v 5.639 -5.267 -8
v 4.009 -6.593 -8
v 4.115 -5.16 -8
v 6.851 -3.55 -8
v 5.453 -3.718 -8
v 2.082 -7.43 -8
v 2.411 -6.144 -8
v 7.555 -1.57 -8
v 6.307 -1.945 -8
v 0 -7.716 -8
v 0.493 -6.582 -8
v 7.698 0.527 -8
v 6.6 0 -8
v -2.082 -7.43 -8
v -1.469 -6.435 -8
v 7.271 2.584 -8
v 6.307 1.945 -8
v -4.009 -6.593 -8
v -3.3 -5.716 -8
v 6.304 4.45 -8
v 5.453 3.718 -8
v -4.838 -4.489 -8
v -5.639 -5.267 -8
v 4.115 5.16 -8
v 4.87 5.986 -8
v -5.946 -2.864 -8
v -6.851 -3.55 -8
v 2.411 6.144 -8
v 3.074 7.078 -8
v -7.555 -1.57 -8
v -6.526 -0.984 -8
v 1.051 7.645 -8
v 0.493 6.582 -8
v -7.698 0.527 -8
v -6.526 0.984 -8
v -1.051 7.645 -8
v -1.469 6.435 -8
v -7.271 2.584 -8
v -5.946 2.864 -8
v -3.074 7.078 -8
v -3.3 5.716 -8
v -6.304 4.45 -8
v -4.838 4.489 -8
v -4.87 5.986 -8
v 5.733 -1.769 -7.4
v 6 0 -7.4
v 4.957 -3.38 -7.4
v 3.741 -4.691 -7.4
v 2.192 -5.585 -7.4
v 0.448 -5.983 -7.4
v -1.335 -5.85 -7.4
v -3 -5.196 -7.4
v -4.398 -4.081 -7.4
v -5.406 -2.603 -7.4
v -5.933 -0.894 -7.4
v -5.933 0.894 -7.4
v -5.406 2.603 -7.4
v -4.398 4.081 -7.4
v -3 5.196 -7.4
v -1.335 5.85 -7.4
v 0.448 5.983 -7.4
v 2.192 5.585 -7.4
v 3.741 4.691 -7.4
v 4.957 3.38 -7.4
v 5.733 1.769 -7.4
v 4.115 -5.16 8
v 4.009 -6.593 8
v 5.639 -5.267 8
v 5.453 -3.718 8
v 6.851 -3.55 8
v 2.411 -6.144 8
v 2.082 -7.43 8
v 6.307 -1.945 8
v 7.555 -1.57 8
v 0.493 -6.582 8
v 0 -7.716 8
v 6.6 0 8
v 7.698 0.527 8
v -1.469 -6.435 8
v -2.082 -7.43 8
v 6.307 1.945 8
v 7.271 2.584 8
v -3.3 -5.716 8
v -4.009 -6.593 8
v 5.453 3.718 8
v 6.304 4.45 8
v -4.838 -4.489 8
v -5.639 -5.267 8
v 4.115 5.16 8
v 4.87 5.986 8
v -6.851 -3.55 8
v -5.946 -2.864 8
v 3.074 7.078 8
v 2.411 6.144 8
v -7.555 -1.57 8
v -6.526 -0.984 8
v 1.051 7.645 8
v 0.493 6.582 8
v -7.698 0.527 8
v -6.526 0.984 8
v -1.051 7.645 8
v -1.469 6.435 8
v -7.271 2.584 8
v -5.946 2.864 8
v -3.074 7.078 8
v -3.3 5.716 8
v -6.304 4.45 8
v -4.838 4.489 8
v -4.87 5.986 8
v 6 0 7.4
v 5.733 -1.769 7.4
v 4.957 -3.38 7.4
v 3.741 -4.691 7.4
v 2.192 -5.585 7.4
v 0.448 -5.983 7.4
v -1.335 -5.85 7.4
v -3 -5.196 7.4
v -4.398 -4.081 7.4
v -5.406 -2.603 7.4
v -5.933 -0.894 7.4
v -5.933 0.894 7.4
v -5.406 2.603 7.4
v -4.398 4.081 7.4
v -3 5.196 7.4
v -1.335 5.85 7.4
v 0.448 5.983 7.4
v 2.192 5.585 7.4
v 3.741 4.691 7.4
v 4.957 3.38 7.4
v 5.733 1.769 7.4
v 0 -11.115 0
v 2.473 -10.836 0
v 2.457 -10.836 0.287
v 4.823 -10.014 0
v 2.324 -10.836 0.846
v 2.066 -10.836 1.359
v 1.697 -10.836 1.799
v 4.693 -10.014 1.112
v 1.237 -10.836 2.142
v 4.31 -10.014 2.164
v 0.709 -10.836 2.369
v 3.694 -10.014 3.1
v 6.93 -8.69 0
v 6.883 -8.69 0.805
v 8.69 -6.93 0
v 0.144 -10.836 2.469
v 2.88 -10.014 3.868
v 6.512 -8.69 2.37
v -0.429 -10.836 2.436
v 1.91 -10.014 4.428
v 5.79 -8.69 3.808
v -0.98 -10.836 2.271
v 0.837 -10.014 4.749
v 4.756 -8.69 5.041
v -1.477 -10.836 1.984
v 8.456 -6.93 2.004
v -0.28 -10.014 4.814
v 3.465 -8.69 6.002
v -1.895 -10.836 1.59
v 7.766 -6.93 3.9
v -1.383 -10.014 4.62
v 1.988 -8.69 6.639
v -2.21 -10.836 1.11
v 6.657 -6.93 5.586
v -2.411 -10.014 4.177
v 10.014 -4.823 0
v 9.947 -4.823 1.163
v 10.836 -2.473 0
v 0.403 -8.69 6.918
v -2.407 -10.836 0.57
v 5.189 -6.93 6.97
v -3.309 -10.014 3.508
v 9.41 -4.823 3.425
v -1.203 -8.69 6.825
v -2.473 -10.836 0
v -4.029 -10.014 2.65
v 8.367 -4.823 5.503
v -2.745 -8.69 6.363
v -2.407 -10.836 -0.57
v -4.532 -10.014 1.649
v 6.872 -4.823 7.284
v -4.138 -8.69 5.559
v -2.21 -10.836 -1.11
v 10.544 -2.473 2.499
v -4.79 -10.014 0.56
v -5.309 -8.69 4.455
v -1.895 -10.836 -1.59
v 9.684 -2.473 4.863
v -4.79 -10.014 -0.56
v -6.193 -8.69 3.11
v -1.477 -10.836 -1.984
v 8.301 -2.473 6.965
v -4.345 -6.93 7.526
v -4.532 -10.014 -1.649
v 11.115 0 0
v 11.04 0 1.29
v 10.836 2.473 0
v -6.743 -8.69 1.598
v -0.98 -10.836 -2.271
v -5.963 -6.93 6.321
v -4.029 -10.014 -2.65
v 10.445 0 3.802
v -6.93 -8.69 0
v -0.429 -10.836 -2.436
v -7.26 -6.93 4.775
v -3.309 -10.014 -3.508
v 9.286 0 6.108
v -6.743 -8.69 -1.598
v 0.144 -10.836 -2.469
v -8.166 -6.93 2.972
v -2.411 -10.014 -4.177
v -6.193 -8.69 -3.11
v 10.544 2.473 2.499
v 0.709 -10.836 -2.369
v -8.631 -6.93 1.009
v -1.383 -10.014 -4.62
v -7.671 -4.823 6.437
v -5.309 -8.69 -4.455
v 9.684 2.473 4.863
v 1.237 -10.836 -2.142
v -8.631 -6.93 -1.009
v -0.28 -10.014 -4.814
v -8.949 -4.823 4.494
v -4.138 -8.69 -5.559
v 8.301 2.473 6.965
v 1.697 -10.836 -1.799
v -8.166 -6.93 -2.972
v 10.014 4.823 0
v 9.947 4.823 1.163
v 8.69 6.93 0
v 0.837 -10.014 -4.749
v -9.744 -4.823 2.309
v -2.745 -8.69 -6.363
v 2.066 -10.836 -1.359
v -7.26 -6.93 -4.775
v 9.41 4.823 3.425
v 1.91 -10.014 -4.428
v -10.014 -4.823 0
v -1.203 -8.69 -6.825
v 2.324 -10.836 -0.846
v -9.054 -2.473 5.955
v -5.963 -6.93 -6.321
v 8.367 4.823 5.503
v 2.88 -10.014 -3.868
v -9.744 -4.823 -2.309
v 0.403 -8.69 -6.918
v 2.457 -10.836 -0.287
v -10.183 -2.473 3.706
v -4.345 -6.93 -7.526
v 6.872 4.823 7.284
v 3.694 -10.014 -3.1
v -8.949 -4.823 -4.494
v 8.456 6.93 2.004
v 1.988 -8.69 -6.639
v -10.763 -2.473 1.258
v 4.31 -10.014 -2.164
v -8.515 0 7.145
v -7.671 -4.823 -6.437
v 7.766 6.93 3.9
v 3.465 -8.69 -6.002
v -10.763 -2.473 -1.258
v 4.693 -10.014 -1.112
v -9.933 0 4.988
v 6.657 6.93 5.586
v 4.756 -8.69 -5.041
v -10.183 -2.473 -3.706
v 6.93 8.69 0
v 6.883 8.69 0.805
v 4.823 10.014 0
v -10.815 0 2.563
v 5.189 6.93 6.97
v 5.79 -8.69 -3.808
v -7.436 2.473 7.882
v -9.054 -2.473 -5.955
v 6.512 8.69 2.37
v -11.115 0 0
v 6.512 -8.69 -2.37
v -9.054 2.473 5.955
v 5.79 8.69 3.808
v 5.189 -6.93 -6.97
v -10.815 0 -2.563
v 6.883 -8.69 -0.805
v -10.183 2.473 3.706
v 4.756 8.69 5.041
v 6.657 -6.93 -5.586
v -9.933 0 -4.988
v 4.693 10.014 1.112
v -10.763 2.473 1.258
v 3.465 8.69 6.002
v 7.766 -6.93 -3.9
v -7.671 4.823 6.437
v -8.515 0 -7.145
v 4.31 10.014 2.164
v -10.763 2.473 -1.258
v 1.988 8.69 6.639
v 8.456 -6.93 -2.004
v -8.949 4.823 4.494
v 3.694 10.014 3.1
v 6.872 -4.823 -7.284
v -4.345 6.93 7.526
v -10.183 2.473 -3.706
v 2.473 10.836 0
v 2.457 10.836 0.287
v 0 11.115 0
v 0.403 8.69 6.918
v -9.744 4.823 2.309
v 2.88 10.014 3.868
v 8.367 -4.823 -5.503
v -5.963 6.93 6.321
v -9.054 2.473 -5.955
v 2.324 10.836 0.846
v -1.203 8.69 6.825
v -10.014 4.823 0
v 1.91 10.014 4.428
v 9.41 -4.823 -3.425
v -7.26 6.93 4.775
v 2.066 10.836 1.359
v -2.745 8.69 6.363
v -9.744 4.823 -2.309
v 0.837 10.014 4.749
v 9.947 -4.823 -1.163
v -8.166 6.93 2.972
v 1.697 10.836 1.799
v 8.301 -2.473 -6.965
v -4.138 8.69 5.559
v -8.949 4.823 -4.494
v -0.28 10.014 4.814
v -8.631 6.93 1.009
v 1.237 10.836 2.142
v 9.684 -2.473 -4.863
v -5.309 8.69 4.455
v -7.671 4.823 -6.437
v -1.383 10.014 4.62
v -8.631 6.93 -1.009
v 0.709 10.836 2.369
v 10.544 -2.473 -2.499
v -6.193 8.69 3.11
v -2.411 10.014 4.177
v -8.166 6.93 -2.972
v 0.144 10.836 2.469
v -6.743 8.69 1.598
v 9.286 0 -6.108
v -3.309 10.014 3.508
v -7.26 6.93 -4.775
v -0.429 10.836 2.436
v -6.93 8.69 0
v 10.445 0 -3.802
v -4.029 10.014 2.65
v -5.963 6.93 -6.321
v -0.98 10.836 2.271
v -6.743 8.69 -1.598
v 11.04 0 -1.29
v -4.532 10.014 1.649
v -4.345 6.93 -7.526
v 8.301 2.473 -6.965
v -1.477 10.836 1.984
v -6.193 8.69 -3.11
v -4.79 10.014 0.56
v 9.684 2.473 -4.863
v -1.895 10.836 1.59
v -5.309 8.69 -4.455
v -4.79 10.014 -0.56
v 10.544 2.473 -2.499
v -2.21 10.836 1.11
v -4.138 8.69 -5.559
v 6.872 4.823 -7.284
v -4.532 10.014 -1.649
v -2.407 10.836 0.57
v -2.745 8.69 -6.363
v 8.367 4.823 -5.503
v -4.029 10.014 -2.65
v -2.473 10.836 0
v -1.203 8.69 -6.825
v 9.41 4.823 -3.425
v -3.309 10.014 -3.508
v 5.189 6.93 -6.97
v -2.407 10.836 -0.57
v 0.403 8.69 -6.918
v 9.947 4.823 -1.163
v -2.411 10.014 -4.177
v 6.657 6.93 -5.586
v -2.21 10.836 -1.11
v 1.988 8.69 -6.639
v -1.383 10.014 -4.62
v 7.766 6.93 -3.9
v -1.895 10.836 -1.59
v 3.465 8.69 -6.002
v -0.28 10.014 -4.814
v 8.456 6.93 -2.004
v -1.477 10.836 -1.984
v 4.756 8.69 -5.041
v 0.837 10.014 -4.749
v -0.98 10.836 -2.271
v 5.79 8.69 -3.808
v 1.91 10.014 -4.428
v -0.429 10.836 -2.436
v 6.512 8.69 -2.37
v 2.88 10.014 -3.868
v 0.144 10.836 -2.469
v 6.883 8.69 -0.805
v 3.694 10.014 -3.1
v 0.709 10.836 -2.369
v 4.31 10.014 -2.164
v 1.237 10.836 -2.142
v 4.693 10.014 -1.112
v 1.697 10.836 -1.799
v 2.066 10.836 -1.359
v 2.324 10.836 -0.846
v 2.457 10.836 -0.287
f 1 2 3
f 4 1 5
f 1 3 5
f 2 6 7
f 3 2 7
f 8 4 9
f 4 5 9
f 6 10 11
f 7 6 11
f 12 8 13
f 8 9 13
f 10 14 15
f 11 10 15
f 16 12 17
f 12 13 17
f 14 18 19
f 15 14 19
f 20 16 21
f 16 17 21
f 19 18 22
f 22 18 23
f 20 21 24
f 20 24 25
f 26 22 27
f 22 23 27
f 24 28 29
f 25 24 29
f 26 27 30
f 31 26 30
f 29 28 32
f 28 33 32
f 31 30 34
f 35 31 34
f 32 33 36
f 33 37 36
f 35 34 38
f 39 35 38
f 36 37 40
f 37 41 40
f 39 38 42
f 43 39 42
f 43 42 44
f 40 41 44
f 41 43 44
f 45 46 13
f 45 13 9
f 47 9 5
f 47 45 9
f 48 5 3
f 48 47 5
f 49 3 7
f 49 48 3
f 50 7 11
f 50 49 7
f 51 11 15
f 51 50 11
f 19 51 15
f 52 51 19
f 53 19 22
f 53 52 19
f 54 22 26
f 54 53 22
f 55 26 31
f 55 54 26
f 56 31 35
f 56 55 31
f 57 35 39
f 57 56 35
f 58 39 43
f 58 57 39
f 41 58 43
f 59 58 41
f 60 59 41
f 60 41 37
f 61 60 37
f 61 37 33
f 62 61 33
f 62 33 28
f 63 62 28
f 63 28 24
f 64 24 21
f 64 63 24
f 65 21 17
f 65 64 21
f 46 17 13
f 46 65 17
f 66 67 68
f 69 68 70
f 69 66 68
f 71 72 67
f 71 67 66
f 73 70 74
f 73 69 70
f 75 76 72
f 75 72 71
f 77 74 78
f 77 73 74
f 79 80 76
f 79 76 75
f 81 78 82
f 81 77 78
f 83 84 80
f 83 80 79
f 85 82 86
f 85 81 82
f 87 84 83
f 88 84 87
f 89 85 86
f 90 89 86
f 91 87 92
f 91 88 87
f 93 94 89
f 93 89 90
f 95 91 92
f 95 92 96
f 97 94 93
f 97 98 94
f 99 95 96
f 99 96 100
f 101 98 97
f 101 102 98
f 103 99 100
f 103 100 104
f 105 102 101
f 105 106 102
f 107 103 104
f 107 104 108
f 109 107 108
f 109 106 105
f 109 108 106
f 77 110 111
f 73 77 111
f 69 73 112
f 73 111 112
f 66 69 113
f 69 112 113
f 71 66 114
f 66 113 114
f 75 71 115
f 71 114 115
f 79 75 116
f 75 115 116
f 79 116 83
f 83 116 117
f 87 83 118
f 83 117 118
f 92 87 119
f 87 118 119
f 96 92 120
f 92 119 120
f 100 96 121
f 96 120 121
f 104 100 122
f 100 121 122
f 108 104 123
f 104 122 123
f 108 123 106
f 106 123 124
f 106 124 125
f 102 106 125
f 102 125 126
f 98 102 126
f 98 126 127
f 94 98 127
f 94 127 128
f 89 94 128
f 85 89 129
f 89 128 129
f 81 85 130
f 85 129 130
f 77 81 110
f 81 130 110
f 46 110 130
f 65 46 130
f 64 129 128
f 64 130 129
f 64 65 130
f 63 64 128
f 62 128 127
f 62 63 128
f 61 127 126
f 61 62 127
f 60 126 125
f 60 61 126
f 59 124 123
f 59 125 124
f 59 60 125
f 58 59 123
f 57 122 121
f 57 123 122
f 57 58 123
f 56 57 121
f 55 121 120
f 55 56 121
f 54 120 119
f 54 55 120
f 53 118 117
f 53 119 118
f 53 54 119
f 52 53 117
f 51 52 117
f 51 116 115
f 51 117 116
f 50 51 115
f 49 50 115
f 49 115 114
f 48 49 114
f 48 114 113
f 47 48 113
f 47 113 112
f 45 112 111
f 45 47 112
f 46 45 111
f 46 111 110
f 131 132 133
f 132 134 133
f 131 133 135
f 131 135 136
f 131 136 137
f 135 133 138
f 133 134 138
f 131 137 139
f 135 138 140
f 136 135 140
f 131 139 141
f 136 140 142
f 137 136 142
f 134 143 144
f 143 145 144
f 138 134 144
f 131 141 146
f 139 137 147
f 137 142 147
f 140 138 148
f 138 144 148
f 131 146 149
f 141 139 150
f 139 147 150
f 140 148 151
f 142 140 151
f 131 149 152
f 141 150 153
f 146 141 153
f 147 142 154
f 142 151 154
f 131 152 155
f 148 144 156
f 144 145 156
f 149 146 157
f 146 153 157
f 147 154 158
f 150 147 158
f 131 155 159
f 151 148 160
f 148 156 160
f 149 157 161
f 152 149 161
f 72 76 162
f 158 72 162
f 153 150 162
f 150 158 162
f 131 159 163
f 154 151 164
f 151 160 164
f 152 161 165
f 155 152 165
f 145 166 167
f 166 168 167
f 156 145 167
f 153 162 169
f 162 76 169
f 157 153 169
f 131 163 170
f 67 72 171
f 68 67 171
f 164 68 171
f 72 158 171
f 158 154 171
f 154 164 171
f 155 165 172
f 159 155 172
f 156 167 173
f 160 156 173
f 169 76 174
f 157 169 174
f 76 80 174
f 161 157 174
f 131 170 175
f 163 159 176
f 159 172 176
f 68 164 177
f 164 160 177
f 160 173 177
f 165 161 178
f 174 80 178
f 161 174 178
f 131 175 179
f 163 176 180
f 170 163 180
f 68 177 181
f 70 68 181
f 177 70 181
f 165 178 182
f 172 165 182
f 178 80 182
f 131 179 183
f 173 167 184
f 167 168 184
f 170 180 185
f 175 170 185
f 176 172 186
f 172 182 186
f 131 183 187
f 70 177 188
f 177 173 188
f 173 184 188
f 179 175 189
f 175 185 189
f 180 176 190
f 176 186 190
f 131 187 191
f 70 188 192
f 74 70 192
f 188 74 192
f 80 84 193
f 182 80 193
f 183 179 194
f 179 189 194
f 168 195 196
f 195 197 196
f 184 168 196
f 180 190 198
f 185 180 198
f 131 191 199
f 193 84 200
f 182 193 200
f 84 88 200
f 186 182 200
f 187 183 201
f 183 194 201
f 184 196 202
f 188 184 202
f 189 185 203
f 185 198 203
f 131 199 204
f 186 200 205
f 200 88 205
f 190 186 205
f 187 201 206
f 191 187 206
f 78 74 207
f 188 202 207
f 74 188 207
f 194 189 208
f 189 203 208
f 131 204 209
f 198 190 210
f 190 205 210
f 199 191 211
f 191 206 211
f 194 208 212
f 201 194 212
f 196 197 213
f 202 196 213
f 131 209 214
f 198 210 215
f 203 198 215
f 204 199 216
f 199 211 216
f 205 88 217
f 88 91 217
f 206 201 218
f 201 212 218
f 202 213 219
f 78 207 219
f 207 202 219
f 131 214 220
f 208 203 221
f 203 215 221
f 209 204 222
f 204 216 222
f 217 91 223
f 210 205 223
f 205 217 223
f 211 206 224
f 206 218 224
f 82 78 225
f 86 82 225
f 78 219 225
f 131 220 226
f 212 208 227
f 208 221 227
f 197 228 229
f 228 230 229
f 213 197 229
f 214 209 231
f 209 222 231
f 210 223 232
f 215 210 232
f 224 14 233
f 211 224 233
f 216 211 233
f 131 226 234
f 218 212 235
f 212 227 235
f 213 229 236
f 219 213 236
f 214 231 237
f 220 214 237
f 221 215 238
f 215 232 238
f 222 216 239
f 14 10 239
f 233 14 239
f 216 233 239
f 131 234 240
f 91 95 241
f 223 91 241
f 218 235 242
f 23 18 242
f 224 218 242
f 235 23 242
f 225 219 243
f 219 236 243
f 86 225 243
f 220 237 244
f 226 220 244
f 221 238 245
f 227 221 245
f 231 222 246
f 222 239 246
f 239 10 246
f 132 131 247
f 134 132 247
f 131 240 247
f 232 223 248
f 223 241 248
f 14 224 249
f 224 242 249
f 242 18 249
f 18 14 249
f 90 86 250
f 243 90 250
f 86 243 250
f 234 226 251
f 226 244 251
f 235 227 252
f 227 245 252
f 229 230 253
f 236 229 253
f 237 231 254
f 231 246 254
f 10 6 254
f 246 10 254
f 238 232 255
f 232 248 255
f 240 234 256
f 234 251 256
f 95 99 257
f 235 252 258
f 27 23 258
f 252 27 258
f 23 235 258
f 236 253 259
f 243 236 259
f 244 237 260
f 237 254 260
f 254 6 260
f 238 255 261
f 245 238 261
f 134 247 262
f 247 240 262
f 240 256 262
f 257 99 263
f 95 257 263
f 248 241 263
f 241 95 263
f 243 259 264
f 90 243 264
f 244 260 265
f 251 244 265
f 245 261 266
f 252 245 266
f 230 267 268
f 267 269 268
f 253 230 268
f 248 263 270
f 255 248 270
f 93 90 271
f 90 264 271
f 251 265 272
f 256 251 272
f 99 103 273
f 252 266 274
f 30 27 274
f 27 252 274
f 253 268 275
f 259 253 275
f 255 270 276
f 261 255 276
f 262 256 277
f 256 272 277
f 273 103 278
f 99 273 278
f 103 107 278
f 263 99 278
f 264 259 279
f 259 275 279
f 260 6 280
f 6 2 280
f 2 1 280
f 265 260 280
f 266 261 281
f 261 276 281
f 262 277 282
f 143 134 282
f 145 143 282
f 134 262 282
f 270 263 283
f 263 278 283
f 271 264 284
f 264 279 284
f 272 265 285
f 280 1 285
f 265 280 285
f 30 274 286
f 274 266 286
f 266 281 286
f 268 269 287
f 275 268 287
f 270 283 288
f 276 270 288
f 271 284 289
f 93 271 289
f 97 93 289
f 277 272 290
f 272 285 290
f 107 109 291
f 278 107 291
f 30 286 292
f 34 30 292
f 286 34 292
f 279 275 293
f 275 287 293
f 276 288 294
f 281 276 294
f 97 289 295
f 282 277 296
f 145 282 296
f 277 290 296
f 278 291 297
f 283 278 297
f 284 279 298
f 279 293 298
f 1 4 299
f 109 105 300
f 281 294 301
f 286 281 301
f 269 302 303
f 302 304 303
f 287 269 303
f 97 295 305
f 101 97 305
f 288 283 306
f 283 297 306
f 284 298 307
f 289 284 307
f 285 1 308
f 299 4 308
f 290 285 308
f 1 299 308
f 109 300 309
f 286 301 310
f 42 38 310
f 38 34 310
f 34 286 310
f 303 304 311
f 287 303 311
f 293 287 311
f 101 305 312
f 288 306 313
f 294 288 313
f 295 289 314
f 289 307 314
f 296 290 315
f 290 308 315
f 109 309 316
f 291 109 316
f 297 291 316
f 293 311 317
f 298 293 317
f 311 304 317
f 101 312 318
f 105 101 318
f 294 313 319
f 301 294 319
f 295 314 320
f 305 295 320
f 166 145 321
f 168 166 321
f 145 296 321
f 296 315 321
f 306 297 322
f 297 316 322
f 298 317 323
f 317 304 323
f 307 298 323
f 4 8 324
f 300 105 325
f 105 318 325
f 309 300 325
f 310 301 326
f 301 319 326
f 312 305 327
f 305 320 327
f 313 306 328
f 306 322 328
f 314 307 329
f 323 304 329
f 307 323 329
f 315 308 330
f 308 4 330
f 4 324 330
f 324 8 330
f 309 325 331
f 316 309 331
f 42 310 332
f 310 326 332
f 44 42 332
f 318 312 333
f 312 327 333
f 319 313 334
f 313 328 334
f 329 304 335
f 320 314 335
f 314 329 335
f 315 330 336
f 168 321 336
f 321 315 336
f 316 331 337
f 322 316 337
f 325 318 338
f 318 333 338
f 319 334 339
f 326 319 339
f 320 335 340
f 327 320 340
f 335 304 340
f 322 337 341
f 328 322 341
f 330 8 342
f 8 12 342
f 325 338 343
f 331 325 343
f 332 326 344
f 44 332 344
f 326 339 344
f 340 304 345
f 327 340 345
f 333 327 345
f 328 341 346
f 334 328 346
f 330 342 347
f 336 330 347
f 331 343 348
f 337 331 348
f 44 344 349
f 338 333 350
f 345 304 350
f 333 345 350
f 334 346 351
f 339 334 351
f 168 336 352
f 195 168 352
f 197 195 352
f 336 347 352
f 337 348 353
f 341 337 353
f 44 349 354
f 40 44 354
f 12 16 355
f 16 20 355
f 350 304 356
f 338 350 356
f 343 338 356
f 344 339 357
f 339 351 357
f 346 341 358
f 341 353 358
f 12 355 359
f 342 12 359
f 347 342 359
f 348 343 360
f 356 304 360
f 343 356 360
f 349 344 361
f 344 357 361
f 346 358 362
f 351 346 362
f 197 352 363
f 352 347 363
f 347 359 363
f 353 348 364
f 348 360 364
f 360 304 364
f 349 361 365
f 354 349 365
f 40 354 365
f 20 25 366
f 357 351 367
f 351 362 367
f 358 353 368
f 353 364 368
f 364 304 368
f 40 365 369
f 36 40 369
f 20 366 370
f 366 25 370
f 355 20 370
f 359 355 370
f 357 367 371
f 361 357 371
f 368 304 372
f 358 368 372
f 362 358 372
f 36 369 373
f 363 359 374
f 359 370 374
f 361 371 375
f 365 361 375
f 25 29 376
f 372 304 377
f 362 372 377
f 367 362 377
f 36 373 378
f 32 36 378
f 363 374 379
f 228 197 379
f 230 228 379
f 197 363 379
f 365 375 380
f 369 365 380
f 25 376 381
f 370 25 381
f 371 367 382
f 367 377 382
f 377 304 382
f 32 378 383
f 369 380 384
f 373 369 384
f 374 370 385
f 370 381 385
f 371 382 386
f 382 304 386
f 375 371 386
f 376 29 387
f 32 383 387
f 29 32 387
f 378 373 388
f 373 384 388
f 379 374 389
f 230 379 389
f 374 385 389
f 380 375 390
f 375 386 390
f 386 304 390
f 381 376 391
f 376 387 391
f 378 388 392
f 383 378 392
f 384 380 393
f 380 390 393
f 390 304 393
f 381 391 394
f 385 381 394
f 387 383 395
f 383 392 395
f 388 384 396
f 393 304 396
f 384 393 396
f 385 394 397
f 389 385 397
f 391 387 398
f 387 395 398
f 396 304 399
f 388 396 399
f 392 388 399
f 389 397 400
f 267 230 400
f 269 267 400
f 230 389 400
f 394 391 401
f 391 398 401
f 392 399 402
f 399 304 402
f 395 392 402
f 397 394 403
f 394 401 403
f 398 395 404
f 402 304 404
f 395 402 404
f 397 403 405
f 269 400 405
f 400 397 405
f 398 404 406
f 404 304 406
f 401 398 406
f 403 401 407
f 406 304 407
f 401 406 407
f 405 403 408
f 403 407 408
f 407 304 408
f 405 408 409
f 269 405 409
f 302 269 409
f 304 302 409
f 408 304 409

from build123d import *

# Parameters (mm, degrees)
CUT_EXTRUDE3_DEPTH      = 20.251744726
CUT_EXTRUDE3_DEPTH_BACK = 20.251744726
SKETCH8_W               = 7
SKETCH8_H               = 36
CUT_EXTRUDE4_DEPTH      = 20.251744726
CUT_EXTRUDE4_DEPTH_BACK = 20.251744726
SKETCH10_R              = 6
CHAMFER1_SIZE           = 0.6


with BuildPart() as part:
    # Sketch7 → Revolve3 (revolve)
    with BuildSketch(Plane.XY):
        with BuildLine():
            Line((0, 11.115), (0, -11.115))
            ThreePointArc((0, -11.115), (11.115, 0), (0, 11.115))
        make_face()
    revolve(axis=Axis((0, 11.115, 0), (0, -1, 0)))

    # Sketch8 → Cut-Extrude3 (cut, two sides: drawn at the far end of the back side and taken through both)
    with BuildSketch(Plane(origin=(0, 0, 0), x_dir=(0, 0, -1), z_dir=(1, 0, 0)).offset(-CUT_EXTRUDE3_DEPTH_BACK)):
        with Locations((-11.5, 0)):
            Rectangle(SKETCH8_W, SKETCH8_H)
        with Locations((11.5, 0)):
            Rectangle(SKETCH8_W, SKETCH8_H)
    extrude(amount=CUT_EXTRUDE3_DEPTH + CUT_EXTRUDE3_DEPTH_BACK, mode=Mode.SUBTRACT)

    # Sketch10 → Cut-Extrude4 (cut, two sides: drawn at the far end of the back side and taken through both)
    with BuildSketch(Plane.XY.offset(-CUT_EXTRUDE4_DEPTH_BACK)):
        Circle(SKETCH10_R)
    extrude(amount=CUT_EXTRUDE4_DEPTH + CUT_EXTRUDE4_DEPTH_BACK, mode=Mode.SUBTRACT)

    # Chamfer1
    chamfer1_edges = [part.edges().sort_by_distance(p)[0] for p in [
        (-6, 0, -8),
        (-6, 0, 8),
    ]]
    chamfer(chamfer1_edges, length=CHAMFER1_SIZE)


solid = part.part
